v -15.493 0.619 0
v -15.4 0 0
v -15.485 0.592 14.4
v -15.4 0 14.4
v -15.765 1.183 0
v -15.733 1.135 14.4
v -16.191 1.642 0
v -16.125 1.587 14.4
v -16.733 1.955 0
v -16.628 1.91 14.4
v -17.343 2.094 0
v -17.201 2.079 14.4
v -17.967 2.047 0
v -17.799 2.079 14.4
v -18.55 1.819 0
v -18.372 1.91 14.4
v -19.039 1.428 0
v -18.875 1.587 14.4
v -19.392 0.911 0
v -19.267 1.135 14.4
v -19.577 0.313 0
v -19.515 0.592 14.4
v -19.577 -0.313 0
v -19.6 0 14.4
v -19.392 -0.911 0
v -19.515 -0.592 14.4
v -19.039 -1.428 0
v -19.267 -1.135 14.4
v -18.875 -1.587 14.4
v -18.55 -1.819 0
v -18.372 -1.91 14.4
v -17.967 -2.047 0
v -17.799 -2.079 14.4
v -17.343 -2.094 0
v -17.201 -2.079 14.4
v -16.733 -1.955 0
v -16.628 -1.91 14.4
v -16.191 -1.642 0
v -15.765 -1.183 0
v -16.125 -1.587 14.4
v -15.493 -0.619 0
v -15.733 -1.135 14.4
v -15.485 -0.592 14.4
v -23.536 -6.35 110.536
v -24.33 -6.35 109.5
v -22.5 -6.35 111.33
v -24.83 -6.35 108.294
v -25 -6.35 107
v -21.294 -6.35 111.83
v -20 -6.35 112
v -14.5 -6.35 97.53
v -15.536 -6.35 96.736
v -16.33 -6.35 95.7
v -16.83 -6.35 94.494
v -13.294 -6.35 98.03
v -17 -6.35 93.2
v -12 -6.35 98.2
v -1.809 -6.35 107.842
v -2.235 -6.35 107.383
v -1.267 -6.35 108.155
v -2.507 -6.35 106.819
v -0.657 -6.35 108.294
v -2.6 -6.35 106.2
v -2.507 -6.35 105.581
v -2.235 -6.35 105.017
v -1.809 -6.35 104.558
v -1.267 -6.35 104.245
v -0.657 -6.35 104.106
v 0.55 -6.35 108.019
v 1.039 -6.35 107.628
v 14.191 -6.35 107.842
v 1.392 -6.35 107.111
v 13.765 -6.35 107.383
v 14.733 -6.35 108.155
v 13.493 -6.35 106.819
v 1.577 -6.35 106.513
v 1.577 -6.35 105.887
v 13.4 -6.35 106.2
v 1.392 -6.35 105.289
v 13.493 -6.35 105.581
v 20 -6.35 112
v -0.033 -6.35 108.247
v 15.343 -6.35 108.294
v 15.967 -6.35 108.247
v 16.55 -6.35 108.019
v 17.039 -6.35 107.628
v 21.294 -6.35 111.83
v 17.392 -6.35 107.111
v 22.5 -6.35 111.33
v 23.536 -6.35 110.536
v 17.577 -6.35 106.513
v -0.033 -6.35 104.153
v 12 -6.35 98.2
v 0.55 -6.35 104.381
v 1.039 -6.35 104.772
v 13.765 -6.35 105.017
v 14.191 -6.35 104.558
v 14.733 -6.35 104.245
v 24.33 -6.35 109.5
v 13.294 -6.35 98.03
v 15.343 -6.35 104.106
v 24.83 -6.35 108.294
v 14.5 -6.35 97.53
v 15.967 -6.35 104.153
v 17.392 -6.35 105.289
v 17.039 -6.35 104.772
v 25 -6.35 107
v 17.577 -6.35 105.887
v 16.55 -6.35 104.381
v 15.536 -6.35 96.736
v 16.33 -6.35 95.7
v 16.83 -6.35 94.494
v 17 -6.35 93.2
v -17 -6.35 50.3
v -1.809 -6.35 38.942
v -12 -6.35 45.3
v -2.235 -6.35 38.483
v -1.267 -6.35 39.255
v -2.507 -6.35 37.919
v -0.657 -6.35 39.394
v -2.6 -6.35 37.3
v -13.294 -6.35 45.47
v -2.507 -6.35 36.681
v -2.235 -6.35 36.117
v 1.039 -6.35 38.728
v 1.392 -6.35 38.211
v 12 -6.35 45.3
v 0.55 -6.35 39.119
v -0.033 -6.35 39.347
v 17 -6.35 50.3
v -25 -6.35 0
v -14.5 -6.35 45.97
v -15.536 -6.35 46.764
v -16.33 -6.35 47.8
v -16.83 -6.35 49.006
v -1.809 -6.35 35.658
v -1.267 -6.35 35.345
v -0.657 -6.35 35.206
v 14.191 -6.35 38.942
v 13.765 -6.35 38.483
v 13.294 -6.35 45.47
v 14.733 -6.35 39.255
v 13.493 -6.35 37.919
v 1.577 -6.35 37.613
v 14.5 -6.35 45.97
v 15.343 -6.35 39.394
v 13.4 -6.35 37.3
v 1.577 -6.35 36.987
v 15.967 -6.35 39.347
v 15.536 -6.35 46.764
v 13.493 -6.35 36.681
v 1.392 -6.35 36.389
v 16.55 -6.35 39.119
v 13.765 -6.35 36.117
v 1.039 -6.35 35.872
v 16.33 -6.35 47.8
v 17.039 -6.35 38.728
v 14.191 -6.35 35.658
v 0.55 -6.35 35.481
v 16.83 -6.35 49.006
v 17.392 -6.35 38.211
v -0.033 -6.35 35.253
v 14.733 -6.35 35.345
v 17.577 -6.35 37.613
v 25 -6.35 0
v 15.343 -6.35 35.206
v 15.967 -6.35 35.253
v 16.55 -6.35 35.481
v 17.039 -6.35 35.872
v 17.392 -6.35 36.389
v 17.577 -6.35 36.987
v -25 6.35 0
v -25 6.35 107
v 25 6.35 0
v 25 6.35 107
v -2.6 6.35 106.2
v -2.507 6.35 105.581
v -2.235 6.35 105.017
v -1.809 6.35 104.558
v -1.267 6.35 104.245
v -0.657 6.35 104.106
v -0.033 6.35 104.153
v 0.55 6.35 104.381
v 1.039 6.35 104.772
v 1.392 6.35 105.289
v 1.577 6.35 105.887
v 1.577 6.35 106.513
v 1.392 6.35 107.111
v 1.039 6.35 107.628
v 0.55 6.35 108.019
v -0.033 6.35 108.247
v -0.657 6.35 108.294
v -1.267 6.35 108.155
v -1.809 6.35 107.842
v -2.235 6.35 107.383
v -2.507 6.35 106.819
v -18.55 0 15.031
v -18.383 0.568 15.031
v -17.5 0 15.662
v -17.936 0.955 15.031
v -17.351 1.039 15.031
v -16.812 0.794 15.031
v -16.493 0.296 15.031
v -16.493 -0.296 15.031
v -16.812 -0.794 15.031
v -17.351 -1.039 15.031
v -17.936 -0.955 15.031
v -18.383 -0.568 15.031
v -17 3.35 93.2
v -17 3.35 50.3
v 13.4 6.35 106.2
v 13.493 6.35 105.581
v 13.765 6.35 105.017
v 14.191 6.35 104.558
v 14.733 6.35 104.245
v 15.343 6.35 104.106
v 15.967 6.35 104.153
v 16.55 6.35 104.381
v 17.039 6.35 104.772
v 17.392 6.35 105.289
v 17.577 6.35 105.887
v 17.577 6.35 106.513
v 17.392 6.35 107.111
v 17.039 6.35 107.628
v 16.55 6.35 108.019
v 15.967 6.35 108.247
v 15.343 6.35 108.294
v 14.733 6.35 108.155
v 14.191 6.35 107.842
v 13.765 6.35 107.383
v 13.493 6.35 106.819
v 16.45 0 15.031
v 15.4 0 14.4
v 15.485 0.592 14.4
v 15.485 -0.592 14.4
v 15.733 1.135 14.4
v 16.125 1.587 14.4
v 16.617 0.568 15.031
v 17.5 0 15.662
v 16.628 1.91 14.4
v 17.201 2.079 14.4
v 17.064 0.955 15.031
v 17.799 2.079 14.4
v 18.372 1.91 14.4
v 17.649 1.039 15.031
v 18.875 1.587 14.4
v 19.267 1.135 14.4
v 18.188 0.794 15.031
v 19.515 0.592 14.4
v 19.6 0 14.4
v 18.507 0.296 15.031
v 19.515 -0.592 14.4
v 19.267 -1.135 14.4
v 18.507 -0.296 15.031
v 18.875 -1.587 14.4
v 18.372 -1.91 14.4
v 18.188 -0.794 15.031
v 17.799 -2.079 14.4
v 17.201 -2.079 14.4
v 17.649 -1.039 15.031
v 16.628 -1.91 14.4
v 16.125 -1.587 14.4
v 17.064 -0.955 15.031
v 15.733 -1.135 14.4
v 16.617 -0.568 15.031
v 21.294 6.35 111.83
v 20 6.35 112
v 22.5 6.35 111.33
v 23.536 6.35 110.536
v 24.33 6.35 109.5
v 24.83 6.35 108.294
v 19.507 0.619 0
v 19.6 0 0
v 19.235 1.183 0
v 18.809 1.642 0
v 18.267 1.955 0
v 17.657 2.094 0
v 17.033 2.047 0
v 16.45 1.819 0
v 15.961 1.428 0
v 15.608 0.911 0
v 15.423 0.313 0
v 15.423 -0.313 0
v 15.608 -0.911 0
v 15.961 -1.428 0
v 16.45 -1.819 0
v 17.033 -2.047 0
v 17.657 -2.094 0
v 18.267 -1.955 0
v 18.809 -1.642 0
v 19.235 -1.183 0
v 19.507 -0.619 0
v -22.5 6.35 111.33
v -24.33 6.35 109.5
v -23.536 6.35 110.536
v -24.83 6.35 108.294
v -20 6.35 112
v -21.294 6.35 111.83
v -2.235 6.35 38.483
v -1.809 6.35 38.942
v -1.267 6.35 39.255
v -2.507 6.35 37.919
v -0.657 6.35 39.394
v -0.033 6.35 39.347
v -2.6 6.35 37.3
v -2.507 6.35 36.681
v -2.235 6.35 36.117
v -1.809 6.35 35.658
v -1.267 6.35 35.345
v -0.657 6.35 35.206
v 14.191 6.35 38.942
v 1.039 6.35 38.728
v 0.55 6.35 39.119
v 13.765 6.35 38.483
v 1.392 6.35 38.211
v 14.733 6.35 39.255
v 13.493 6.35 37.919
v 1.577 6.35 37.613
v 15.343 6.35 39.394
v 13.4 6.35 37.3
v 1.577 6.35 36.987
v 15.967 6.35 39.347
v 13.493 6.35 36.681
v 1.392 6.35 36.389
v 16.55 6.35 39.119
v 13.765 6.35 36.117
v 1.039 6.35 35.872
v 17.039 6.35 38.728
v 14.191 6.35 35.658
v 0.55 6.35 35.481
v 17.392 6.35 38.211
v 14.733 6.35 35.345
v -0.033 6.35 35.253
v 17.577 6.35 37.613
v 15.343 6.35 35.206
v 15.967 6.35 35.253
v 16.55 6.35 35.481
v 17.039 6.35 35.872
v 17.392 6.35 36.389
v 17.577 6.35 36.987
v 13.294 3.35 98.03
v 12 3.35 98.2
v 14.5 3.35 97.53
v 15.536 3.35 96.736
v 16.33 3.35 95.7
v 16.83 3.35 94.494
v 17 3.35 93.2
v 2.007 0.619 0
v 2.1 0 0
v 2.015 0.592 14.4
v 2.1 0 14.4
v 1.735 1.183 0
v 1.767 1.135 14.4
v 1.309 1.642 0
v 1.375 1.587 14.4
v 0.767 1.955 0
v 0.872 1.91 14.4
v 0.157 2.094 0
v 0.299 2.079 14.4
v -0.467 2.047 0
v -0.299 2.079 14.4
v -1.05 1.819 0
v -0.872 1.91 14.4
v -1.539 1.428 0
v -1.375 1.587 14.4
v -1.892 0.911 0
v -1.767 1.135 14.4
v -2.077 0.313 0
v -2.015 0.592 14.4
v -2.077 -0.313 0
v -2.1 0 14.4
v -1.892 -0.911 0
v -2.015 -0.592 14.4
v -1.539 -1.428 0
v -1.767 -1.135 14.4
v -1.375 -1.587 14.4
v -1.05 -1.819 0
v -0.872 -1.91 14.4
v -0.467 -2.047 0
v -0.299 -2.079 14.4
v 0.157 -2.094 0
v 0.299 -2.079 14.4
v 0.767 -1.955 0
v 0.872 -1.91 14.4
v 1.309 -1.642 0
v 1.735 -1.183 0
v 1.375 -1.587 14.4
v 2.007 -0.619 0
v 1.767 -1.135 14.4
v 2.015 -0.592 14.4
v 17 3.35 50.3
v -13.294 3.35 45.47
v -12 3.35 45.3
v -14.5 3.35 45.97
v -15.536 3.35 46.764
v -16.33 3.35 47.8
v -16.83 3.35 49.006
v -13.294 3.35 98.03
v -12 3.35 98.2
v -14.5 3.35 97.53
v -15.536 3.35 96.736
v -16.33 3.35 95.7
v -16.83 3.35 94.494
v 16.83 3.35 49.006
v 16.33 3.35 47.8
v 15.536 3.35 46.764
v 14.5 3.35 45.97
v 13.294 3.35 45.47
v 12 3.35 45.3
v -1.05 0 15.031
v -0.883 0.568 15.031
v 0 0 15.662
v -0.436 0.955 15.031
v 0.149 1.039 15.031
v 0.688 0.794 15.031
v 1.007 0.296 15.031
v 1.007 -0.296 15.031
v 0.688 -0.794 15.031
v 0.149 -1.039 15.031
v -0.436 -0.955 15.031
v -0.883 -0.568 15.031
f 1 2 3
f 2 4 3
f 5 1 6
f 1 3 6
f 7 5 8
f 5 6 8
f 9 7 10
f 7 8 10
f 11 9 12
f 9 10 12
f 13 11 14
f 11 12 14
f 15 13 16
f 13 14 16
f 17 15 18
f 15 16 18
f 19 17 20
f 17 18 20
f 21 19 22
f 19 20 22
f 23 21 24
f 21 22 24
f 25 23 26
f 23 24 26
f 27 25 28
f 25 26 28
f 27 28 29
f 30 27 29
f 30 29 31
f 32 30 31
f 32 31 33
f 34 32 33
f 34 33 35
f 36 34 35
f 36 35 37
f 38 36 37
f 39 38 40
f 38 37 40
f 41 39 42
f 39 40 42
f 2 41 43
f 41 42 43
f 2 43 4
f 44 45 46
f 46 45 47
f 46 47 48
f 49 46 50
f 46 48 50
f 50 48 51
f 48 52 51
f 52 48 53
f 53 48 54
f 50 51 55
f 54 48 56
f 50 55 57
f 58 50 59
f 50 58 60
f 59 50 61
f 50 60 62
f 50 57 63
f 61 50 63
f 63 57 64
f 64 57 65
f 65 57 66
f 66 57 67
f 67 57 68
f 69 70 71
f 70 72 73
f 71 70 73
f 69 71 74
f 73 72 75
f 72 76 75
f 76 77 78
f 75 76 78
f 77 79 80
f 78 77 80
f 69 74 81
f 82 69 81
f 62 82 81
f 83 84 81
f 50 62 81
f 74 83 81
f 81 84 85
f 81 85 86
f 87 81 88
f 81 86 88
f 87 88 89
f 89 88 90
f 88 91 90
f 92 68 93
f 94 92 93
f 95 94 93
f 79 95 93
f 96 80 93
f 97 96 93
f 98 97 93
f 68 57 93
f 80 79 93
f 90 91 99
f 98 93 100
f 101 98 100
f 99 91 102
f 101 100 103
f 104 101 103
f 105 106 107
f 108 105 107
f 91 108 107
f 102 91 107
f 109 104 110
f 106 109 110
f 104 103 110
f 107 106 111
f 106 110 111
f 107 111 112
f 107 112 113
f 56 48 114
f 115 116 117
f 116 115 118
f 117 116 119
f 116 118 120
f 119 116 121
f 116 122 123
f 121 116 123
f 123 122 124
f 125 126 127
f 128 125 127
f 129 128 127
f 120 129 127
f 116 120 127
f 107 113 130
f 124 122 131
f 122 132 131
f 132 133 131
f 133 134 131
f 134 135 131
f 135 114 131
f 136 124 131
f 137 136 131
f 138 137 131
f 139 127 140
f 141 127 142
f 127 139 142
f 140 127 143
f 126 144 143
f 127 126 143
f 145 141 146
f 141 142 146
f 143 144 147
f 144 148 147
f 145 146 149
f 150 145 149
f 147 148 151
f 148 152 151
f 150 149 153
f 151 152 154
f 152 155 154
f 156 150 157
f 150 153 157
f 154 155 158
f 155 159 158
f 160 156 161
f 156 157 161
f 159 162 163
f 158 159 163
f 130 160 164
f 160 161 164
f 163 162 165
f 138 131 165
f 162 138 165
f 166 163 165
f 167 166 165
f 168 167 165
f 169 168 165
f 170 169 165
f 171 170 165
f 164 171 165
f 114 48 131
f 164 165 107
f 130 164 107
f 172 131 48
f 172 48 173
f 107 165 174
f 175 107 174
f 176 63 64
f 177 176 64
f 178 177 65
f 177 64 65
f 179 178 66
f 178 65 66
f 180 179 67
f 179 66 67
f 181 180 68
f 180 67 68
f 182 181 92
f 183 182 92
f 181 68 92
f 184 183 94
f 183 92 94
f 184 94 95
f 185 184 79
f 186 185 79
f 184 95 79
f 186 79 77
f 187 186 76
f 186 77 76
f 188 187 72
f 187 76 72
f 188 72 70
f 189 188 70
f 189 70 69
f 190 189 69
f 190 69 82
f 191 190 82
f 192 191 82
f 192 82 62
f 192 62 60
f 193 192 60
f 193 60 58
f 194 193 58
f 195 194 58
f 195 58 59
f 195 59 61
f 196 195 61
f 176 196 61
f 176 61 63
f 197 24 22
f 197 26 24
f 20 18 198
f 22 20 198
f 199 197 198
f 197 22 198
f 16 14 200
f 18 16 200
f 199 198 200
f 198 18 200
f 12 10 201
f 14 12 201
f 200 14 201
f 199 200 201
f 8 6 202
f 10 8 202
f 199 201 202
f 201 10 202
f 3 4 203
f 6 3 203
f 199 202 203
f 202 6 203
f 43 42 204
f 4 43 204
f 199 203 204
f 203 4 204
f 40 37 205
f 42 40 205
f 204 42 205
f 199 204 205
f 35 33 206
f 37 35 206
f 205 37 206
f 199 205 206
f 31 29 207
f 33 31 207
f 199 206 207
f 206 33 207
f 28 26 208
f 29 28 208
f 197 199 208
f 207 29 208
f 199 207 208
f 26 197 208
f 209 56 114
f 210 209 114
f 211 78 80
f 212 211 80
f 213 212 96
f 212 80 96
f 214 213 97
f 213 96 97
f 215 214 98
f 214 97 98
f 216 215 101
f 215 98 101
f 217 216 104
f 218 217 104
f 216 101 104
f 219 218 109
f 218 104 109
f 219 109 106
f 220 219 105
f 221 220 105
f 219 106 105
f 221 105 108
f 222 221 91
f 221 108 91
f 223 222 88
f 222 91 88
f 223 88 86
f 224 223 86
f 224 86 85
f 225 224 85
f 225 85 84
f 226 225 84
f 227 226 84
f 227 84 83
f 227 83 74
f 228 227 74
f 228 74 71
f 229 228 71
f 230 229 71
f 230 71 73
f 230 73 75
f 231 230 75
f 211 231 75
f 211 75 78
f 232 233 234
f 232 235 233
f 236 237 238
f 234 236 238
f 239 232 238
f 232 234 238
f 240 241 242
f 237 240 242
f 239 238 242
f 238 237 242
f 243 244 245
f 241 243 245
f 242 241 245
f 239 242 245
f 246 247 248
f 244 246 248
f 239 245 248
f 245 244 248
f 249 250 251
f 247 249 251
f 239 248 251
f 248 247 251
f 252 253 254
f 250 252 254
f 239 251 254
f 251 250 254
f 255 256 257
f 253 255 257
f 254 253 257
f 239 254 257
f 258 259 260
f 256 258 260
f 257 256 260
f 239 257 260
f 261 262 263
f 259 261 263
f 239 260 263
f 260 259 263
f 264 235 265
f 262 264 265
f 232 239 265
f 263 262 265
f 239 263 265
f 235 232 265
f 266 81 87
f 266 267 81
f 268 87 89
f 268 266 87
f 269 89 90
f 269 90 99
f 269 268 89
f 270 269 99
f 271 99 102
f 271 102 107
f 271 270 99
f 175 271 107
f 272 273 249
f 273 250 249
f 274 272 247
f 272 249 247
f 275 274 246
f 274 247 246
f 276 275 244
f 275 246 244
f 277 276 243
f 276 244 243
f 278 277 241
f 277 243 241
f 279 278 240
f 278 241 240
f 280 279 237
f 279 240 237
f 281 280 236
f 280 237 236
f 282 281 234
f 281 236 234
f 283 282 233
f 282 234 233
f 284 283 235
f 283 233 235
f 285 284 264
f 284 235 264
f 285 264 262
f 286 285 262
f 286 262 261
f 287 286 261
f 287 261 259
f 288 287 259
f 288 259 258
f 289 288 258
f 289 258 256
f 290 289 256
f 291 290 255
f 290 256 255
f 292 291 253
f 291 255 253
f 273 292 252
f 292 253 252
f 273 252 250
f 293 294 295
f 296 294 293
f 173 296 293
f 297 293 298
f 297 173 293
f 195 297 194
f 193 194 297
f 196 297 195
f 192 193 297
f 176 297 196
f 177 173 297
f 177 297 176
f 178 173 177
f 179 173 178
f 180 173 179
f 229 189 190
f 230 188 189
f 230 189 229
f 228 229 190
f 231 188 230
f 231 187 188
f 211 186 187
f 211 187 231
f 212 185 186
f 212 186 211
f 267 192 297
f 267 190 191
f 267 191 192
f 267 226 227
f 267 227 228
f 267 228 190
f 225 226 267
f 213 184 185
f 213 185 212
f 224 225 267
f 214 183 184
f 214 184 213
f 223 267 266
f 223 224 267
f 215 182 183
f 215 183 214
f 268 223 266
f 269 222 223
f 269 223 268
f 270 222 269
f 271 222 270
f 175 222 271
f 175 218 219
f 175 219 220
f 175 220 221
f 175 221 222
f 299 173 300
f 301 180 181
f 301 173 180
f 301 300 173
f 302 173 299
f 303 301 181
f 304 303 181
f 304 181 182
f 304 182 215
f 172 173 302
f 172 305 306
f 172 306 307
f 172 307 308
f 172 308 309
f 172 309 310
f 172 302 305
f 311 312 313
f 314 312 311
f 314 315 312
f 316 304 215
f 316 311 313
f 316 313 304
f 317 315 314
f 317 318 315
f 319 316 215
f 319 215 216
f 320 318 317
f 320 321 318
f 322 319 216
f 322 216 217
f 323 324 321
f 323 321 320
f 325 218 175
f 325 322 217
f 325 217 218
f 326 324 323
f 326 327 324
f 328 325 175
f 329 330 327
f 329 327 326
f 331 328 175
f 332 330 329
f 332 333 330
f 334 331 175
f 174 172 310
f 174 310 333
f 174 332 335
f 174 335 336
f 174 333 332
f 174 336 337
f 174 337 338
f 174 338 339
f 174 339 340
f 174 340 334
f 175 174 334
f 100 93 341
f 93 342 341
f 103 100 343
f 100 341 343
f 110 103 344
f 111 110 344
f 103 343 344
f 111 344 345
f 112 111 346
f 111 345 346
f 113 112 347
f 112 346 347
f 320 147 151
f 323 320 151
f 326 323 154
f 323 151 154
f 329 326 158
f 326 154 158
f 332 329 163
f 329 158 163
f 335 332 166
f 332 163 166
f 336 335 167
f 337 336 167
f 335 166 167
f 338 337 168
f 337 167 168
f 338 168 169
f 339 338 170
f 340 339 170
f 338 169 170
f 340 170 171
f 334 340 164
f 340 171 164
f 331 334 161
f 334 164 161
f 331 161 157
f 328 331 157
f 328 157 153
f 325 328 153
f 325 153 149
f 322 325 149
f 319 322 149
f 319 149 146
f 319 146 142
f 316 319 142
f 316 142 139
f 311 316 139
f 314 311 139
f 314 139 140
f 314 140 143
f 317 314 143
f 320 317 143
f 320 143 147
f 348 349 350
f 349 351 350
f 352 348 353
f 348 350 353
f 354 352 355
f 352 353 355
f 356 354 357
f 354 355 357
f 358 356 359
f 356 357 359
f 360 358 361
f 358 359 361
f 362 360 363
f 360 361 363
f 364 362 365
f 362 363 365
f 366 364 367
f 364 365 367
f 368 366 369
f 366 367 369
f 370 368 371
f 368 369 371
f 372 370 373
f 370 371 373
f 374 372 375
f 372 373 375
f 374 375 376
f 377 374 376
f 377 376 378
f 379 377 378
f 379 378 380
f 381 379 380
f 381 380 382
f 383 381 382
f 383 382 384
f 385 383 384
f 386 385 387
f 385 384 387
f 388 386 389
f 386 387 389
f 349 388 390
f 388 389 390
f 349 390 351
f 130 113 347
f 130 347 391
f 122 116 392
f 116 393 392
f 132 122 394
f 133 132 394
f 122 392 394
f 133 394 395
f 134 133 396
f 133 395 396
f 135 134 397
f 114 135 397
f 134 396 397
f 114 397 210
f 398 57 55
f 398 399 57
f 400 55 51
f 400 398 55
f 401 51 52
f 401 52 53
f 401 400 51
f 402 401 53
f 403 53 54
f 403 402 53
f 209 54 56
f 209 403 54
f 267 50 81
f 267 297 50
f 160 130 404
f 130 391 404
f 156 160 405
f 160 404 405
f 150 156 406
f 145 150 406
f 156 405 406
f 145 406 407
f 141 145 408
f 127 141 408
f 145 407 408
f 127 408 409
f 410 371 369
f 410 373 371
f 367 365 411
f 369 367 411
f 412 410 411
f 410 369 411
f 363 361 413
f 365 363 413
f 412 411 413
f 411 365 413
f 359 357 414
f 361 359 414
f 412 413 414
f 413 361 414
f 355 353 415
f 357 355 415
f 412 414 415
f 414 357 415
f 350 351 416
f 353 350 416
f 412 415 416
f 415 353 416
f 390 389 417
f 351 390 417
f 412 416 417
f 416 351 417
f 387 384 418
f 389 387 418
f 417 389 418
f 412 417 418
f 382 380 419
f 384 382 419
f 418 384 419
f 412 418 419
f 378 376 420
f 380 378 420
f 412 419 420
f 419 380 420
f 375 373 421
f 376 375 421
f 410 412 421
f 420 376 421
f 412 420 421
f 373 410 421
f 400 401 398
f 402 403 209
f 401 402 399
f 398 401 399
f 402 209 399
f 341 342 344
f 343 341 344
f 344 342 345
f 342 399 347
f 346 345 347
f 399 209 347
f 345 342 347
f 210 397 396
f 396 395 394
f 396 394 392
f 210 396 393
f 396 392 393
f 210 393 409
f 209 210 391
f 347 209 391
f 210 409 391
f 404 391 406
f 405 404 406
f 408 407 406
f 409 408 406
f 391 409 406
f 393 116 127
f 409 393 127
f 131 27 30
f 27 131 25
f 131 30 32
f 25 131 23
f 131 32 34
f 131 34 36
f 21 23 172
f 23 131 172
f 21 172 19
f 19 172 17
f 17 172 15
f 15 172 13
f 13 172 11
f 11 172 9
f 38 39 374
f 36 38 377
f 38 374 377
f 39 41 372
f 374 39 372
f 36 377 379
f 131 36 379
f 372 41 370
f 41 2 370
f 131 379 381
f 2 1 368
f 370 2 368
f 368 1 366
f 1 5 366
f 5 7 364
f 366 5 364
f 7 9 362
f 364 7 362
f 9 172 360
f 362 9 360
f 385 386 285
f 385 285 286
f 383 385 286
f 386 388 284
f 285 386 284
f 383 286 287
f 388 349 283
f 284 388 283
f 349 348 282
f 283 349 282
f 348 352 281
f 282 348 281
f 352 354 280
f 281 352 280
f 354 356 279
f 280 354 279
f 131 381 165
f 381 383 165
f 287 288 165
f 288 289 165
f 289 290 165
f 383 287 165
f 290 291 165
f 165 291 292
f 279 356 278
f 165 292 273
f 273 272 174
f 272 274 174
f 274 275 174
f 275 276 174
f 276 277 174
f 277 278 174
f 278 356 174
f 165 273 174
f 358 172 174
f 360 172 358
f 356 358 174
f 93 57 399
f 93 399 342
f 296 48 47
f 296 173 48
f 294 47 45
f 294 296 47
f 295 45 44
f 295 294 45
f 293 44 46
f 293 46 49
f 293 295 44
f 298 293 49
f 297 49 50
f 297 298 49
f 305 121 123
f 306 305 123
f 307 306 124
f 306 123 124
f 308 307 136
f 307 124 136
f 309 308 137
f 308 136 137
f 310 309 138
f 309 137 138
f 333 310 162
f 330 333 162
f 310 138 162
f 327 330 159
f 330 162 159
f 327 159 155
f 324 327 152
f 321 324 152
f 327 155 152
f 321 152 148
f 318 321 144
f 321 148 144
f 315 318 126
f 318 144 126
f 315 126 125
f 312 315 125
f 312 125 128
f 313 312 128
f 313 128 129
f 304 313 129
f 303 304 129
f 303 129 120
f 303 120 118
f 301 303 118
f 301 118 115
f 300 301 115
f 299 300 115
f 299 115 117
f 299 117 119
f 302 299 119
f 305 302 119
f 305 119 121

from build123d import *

# Parameters (mm, degrees)
SKETCH12_W                = 50
SKETCH12_H                = 12.7
BOSS_EXTRUDE1_DEPTH       = 112
M5X0_8_TAPPED_HOLE2_D     = 4.2
M5X0_8_TAPPED_HOLE2_DEPTH = 14.4
M5X0_8_TAPPED_HOLE2_TIP   = 1.2618073
M5X0_8_TAPPED_HOLE3_D     = 4.2
SKETCH19_W                = 34
SKETCH19_H                = 52.9
CUT_EXTRUDE1_DEPTH        = 9.7
FILLET1_R                 = 5


with BuildPart() as part:
    # Sketch12 → Boss-Extrude1 (new body)
    with BuildSketch(Plane.XY):
        Rectangle(SKETCH12_W, SKETCH12_H)
    extrude(amount=BOSS_EXTRUDE1_DEPTH)

    # M5x0.8 Tapped Hole2
    with Locations(Plane(origin=(0, 0, 0), x_dir=(-1, 0, 0), z_dir=(0, 0, -1))):
        with Locations((-17.5, 0), (0, 0), (17.5, 0)):
            Hole(M5X0_8_TAPPED_HOLE2_D / 2, depth=M5X0_8_TAPPED_HOLE2_DEPTH)
            with Locations((0, 0, -(M5X0_8_TAPPED_HOLE2_DEPTH + M5X0_8_TAPPED_HOLE2_TIP / 2))):  # 118° drill point
                Cone(0, M5X0_8_TAPPED_HOLE2_D / 2, M5X0_8_TAPPED_HOLE2_TIP, mode=Mode.SUBTRACT)

    # M5x0.8 Tapped Hole3 (through all)
    with Locations(Plane(origin=(0, 6.35, 0), x_dir=(1, 0, 0), z_dir=(0, 1, 0))):
        with Locations((-0.5, -37.3), (15.5, -37.3), (15.5, -106.2), (-0.5, -106.2)):
            Hole(M5X0_8_TAPPED_HOLE3_D / 2)

    # Sketch19 → Cut-Extrude1 (cut)
    with BuildSketch(Plane(origin=(0, -6.35, 0), x_dir=(1, 0, 0), z_dir=(0, 1, 0))):
        with Locations((0, -71.75)):
            Rectangle(SKETCH19_W, SKETCH19_H)
    extrude(amount=CUT_EXTRUDE1_DEPTH, mode=Mode.SUBTRACT)

    # Fillet1
    fillet1_edges = [part.edges().sort_by_distance(p)[0] for p in [
        (-25, 0, 112),
        (25, 0, 112),
        (-17, -1.5, 45.3),
        (-17, -1.5, 98.2),
        (17, -1.5, 98.2),
        (17, -1.5, 45.3),
    ]]
    fillet(fillet1_edges, radius=FILLET1_R)


solid = part.part
